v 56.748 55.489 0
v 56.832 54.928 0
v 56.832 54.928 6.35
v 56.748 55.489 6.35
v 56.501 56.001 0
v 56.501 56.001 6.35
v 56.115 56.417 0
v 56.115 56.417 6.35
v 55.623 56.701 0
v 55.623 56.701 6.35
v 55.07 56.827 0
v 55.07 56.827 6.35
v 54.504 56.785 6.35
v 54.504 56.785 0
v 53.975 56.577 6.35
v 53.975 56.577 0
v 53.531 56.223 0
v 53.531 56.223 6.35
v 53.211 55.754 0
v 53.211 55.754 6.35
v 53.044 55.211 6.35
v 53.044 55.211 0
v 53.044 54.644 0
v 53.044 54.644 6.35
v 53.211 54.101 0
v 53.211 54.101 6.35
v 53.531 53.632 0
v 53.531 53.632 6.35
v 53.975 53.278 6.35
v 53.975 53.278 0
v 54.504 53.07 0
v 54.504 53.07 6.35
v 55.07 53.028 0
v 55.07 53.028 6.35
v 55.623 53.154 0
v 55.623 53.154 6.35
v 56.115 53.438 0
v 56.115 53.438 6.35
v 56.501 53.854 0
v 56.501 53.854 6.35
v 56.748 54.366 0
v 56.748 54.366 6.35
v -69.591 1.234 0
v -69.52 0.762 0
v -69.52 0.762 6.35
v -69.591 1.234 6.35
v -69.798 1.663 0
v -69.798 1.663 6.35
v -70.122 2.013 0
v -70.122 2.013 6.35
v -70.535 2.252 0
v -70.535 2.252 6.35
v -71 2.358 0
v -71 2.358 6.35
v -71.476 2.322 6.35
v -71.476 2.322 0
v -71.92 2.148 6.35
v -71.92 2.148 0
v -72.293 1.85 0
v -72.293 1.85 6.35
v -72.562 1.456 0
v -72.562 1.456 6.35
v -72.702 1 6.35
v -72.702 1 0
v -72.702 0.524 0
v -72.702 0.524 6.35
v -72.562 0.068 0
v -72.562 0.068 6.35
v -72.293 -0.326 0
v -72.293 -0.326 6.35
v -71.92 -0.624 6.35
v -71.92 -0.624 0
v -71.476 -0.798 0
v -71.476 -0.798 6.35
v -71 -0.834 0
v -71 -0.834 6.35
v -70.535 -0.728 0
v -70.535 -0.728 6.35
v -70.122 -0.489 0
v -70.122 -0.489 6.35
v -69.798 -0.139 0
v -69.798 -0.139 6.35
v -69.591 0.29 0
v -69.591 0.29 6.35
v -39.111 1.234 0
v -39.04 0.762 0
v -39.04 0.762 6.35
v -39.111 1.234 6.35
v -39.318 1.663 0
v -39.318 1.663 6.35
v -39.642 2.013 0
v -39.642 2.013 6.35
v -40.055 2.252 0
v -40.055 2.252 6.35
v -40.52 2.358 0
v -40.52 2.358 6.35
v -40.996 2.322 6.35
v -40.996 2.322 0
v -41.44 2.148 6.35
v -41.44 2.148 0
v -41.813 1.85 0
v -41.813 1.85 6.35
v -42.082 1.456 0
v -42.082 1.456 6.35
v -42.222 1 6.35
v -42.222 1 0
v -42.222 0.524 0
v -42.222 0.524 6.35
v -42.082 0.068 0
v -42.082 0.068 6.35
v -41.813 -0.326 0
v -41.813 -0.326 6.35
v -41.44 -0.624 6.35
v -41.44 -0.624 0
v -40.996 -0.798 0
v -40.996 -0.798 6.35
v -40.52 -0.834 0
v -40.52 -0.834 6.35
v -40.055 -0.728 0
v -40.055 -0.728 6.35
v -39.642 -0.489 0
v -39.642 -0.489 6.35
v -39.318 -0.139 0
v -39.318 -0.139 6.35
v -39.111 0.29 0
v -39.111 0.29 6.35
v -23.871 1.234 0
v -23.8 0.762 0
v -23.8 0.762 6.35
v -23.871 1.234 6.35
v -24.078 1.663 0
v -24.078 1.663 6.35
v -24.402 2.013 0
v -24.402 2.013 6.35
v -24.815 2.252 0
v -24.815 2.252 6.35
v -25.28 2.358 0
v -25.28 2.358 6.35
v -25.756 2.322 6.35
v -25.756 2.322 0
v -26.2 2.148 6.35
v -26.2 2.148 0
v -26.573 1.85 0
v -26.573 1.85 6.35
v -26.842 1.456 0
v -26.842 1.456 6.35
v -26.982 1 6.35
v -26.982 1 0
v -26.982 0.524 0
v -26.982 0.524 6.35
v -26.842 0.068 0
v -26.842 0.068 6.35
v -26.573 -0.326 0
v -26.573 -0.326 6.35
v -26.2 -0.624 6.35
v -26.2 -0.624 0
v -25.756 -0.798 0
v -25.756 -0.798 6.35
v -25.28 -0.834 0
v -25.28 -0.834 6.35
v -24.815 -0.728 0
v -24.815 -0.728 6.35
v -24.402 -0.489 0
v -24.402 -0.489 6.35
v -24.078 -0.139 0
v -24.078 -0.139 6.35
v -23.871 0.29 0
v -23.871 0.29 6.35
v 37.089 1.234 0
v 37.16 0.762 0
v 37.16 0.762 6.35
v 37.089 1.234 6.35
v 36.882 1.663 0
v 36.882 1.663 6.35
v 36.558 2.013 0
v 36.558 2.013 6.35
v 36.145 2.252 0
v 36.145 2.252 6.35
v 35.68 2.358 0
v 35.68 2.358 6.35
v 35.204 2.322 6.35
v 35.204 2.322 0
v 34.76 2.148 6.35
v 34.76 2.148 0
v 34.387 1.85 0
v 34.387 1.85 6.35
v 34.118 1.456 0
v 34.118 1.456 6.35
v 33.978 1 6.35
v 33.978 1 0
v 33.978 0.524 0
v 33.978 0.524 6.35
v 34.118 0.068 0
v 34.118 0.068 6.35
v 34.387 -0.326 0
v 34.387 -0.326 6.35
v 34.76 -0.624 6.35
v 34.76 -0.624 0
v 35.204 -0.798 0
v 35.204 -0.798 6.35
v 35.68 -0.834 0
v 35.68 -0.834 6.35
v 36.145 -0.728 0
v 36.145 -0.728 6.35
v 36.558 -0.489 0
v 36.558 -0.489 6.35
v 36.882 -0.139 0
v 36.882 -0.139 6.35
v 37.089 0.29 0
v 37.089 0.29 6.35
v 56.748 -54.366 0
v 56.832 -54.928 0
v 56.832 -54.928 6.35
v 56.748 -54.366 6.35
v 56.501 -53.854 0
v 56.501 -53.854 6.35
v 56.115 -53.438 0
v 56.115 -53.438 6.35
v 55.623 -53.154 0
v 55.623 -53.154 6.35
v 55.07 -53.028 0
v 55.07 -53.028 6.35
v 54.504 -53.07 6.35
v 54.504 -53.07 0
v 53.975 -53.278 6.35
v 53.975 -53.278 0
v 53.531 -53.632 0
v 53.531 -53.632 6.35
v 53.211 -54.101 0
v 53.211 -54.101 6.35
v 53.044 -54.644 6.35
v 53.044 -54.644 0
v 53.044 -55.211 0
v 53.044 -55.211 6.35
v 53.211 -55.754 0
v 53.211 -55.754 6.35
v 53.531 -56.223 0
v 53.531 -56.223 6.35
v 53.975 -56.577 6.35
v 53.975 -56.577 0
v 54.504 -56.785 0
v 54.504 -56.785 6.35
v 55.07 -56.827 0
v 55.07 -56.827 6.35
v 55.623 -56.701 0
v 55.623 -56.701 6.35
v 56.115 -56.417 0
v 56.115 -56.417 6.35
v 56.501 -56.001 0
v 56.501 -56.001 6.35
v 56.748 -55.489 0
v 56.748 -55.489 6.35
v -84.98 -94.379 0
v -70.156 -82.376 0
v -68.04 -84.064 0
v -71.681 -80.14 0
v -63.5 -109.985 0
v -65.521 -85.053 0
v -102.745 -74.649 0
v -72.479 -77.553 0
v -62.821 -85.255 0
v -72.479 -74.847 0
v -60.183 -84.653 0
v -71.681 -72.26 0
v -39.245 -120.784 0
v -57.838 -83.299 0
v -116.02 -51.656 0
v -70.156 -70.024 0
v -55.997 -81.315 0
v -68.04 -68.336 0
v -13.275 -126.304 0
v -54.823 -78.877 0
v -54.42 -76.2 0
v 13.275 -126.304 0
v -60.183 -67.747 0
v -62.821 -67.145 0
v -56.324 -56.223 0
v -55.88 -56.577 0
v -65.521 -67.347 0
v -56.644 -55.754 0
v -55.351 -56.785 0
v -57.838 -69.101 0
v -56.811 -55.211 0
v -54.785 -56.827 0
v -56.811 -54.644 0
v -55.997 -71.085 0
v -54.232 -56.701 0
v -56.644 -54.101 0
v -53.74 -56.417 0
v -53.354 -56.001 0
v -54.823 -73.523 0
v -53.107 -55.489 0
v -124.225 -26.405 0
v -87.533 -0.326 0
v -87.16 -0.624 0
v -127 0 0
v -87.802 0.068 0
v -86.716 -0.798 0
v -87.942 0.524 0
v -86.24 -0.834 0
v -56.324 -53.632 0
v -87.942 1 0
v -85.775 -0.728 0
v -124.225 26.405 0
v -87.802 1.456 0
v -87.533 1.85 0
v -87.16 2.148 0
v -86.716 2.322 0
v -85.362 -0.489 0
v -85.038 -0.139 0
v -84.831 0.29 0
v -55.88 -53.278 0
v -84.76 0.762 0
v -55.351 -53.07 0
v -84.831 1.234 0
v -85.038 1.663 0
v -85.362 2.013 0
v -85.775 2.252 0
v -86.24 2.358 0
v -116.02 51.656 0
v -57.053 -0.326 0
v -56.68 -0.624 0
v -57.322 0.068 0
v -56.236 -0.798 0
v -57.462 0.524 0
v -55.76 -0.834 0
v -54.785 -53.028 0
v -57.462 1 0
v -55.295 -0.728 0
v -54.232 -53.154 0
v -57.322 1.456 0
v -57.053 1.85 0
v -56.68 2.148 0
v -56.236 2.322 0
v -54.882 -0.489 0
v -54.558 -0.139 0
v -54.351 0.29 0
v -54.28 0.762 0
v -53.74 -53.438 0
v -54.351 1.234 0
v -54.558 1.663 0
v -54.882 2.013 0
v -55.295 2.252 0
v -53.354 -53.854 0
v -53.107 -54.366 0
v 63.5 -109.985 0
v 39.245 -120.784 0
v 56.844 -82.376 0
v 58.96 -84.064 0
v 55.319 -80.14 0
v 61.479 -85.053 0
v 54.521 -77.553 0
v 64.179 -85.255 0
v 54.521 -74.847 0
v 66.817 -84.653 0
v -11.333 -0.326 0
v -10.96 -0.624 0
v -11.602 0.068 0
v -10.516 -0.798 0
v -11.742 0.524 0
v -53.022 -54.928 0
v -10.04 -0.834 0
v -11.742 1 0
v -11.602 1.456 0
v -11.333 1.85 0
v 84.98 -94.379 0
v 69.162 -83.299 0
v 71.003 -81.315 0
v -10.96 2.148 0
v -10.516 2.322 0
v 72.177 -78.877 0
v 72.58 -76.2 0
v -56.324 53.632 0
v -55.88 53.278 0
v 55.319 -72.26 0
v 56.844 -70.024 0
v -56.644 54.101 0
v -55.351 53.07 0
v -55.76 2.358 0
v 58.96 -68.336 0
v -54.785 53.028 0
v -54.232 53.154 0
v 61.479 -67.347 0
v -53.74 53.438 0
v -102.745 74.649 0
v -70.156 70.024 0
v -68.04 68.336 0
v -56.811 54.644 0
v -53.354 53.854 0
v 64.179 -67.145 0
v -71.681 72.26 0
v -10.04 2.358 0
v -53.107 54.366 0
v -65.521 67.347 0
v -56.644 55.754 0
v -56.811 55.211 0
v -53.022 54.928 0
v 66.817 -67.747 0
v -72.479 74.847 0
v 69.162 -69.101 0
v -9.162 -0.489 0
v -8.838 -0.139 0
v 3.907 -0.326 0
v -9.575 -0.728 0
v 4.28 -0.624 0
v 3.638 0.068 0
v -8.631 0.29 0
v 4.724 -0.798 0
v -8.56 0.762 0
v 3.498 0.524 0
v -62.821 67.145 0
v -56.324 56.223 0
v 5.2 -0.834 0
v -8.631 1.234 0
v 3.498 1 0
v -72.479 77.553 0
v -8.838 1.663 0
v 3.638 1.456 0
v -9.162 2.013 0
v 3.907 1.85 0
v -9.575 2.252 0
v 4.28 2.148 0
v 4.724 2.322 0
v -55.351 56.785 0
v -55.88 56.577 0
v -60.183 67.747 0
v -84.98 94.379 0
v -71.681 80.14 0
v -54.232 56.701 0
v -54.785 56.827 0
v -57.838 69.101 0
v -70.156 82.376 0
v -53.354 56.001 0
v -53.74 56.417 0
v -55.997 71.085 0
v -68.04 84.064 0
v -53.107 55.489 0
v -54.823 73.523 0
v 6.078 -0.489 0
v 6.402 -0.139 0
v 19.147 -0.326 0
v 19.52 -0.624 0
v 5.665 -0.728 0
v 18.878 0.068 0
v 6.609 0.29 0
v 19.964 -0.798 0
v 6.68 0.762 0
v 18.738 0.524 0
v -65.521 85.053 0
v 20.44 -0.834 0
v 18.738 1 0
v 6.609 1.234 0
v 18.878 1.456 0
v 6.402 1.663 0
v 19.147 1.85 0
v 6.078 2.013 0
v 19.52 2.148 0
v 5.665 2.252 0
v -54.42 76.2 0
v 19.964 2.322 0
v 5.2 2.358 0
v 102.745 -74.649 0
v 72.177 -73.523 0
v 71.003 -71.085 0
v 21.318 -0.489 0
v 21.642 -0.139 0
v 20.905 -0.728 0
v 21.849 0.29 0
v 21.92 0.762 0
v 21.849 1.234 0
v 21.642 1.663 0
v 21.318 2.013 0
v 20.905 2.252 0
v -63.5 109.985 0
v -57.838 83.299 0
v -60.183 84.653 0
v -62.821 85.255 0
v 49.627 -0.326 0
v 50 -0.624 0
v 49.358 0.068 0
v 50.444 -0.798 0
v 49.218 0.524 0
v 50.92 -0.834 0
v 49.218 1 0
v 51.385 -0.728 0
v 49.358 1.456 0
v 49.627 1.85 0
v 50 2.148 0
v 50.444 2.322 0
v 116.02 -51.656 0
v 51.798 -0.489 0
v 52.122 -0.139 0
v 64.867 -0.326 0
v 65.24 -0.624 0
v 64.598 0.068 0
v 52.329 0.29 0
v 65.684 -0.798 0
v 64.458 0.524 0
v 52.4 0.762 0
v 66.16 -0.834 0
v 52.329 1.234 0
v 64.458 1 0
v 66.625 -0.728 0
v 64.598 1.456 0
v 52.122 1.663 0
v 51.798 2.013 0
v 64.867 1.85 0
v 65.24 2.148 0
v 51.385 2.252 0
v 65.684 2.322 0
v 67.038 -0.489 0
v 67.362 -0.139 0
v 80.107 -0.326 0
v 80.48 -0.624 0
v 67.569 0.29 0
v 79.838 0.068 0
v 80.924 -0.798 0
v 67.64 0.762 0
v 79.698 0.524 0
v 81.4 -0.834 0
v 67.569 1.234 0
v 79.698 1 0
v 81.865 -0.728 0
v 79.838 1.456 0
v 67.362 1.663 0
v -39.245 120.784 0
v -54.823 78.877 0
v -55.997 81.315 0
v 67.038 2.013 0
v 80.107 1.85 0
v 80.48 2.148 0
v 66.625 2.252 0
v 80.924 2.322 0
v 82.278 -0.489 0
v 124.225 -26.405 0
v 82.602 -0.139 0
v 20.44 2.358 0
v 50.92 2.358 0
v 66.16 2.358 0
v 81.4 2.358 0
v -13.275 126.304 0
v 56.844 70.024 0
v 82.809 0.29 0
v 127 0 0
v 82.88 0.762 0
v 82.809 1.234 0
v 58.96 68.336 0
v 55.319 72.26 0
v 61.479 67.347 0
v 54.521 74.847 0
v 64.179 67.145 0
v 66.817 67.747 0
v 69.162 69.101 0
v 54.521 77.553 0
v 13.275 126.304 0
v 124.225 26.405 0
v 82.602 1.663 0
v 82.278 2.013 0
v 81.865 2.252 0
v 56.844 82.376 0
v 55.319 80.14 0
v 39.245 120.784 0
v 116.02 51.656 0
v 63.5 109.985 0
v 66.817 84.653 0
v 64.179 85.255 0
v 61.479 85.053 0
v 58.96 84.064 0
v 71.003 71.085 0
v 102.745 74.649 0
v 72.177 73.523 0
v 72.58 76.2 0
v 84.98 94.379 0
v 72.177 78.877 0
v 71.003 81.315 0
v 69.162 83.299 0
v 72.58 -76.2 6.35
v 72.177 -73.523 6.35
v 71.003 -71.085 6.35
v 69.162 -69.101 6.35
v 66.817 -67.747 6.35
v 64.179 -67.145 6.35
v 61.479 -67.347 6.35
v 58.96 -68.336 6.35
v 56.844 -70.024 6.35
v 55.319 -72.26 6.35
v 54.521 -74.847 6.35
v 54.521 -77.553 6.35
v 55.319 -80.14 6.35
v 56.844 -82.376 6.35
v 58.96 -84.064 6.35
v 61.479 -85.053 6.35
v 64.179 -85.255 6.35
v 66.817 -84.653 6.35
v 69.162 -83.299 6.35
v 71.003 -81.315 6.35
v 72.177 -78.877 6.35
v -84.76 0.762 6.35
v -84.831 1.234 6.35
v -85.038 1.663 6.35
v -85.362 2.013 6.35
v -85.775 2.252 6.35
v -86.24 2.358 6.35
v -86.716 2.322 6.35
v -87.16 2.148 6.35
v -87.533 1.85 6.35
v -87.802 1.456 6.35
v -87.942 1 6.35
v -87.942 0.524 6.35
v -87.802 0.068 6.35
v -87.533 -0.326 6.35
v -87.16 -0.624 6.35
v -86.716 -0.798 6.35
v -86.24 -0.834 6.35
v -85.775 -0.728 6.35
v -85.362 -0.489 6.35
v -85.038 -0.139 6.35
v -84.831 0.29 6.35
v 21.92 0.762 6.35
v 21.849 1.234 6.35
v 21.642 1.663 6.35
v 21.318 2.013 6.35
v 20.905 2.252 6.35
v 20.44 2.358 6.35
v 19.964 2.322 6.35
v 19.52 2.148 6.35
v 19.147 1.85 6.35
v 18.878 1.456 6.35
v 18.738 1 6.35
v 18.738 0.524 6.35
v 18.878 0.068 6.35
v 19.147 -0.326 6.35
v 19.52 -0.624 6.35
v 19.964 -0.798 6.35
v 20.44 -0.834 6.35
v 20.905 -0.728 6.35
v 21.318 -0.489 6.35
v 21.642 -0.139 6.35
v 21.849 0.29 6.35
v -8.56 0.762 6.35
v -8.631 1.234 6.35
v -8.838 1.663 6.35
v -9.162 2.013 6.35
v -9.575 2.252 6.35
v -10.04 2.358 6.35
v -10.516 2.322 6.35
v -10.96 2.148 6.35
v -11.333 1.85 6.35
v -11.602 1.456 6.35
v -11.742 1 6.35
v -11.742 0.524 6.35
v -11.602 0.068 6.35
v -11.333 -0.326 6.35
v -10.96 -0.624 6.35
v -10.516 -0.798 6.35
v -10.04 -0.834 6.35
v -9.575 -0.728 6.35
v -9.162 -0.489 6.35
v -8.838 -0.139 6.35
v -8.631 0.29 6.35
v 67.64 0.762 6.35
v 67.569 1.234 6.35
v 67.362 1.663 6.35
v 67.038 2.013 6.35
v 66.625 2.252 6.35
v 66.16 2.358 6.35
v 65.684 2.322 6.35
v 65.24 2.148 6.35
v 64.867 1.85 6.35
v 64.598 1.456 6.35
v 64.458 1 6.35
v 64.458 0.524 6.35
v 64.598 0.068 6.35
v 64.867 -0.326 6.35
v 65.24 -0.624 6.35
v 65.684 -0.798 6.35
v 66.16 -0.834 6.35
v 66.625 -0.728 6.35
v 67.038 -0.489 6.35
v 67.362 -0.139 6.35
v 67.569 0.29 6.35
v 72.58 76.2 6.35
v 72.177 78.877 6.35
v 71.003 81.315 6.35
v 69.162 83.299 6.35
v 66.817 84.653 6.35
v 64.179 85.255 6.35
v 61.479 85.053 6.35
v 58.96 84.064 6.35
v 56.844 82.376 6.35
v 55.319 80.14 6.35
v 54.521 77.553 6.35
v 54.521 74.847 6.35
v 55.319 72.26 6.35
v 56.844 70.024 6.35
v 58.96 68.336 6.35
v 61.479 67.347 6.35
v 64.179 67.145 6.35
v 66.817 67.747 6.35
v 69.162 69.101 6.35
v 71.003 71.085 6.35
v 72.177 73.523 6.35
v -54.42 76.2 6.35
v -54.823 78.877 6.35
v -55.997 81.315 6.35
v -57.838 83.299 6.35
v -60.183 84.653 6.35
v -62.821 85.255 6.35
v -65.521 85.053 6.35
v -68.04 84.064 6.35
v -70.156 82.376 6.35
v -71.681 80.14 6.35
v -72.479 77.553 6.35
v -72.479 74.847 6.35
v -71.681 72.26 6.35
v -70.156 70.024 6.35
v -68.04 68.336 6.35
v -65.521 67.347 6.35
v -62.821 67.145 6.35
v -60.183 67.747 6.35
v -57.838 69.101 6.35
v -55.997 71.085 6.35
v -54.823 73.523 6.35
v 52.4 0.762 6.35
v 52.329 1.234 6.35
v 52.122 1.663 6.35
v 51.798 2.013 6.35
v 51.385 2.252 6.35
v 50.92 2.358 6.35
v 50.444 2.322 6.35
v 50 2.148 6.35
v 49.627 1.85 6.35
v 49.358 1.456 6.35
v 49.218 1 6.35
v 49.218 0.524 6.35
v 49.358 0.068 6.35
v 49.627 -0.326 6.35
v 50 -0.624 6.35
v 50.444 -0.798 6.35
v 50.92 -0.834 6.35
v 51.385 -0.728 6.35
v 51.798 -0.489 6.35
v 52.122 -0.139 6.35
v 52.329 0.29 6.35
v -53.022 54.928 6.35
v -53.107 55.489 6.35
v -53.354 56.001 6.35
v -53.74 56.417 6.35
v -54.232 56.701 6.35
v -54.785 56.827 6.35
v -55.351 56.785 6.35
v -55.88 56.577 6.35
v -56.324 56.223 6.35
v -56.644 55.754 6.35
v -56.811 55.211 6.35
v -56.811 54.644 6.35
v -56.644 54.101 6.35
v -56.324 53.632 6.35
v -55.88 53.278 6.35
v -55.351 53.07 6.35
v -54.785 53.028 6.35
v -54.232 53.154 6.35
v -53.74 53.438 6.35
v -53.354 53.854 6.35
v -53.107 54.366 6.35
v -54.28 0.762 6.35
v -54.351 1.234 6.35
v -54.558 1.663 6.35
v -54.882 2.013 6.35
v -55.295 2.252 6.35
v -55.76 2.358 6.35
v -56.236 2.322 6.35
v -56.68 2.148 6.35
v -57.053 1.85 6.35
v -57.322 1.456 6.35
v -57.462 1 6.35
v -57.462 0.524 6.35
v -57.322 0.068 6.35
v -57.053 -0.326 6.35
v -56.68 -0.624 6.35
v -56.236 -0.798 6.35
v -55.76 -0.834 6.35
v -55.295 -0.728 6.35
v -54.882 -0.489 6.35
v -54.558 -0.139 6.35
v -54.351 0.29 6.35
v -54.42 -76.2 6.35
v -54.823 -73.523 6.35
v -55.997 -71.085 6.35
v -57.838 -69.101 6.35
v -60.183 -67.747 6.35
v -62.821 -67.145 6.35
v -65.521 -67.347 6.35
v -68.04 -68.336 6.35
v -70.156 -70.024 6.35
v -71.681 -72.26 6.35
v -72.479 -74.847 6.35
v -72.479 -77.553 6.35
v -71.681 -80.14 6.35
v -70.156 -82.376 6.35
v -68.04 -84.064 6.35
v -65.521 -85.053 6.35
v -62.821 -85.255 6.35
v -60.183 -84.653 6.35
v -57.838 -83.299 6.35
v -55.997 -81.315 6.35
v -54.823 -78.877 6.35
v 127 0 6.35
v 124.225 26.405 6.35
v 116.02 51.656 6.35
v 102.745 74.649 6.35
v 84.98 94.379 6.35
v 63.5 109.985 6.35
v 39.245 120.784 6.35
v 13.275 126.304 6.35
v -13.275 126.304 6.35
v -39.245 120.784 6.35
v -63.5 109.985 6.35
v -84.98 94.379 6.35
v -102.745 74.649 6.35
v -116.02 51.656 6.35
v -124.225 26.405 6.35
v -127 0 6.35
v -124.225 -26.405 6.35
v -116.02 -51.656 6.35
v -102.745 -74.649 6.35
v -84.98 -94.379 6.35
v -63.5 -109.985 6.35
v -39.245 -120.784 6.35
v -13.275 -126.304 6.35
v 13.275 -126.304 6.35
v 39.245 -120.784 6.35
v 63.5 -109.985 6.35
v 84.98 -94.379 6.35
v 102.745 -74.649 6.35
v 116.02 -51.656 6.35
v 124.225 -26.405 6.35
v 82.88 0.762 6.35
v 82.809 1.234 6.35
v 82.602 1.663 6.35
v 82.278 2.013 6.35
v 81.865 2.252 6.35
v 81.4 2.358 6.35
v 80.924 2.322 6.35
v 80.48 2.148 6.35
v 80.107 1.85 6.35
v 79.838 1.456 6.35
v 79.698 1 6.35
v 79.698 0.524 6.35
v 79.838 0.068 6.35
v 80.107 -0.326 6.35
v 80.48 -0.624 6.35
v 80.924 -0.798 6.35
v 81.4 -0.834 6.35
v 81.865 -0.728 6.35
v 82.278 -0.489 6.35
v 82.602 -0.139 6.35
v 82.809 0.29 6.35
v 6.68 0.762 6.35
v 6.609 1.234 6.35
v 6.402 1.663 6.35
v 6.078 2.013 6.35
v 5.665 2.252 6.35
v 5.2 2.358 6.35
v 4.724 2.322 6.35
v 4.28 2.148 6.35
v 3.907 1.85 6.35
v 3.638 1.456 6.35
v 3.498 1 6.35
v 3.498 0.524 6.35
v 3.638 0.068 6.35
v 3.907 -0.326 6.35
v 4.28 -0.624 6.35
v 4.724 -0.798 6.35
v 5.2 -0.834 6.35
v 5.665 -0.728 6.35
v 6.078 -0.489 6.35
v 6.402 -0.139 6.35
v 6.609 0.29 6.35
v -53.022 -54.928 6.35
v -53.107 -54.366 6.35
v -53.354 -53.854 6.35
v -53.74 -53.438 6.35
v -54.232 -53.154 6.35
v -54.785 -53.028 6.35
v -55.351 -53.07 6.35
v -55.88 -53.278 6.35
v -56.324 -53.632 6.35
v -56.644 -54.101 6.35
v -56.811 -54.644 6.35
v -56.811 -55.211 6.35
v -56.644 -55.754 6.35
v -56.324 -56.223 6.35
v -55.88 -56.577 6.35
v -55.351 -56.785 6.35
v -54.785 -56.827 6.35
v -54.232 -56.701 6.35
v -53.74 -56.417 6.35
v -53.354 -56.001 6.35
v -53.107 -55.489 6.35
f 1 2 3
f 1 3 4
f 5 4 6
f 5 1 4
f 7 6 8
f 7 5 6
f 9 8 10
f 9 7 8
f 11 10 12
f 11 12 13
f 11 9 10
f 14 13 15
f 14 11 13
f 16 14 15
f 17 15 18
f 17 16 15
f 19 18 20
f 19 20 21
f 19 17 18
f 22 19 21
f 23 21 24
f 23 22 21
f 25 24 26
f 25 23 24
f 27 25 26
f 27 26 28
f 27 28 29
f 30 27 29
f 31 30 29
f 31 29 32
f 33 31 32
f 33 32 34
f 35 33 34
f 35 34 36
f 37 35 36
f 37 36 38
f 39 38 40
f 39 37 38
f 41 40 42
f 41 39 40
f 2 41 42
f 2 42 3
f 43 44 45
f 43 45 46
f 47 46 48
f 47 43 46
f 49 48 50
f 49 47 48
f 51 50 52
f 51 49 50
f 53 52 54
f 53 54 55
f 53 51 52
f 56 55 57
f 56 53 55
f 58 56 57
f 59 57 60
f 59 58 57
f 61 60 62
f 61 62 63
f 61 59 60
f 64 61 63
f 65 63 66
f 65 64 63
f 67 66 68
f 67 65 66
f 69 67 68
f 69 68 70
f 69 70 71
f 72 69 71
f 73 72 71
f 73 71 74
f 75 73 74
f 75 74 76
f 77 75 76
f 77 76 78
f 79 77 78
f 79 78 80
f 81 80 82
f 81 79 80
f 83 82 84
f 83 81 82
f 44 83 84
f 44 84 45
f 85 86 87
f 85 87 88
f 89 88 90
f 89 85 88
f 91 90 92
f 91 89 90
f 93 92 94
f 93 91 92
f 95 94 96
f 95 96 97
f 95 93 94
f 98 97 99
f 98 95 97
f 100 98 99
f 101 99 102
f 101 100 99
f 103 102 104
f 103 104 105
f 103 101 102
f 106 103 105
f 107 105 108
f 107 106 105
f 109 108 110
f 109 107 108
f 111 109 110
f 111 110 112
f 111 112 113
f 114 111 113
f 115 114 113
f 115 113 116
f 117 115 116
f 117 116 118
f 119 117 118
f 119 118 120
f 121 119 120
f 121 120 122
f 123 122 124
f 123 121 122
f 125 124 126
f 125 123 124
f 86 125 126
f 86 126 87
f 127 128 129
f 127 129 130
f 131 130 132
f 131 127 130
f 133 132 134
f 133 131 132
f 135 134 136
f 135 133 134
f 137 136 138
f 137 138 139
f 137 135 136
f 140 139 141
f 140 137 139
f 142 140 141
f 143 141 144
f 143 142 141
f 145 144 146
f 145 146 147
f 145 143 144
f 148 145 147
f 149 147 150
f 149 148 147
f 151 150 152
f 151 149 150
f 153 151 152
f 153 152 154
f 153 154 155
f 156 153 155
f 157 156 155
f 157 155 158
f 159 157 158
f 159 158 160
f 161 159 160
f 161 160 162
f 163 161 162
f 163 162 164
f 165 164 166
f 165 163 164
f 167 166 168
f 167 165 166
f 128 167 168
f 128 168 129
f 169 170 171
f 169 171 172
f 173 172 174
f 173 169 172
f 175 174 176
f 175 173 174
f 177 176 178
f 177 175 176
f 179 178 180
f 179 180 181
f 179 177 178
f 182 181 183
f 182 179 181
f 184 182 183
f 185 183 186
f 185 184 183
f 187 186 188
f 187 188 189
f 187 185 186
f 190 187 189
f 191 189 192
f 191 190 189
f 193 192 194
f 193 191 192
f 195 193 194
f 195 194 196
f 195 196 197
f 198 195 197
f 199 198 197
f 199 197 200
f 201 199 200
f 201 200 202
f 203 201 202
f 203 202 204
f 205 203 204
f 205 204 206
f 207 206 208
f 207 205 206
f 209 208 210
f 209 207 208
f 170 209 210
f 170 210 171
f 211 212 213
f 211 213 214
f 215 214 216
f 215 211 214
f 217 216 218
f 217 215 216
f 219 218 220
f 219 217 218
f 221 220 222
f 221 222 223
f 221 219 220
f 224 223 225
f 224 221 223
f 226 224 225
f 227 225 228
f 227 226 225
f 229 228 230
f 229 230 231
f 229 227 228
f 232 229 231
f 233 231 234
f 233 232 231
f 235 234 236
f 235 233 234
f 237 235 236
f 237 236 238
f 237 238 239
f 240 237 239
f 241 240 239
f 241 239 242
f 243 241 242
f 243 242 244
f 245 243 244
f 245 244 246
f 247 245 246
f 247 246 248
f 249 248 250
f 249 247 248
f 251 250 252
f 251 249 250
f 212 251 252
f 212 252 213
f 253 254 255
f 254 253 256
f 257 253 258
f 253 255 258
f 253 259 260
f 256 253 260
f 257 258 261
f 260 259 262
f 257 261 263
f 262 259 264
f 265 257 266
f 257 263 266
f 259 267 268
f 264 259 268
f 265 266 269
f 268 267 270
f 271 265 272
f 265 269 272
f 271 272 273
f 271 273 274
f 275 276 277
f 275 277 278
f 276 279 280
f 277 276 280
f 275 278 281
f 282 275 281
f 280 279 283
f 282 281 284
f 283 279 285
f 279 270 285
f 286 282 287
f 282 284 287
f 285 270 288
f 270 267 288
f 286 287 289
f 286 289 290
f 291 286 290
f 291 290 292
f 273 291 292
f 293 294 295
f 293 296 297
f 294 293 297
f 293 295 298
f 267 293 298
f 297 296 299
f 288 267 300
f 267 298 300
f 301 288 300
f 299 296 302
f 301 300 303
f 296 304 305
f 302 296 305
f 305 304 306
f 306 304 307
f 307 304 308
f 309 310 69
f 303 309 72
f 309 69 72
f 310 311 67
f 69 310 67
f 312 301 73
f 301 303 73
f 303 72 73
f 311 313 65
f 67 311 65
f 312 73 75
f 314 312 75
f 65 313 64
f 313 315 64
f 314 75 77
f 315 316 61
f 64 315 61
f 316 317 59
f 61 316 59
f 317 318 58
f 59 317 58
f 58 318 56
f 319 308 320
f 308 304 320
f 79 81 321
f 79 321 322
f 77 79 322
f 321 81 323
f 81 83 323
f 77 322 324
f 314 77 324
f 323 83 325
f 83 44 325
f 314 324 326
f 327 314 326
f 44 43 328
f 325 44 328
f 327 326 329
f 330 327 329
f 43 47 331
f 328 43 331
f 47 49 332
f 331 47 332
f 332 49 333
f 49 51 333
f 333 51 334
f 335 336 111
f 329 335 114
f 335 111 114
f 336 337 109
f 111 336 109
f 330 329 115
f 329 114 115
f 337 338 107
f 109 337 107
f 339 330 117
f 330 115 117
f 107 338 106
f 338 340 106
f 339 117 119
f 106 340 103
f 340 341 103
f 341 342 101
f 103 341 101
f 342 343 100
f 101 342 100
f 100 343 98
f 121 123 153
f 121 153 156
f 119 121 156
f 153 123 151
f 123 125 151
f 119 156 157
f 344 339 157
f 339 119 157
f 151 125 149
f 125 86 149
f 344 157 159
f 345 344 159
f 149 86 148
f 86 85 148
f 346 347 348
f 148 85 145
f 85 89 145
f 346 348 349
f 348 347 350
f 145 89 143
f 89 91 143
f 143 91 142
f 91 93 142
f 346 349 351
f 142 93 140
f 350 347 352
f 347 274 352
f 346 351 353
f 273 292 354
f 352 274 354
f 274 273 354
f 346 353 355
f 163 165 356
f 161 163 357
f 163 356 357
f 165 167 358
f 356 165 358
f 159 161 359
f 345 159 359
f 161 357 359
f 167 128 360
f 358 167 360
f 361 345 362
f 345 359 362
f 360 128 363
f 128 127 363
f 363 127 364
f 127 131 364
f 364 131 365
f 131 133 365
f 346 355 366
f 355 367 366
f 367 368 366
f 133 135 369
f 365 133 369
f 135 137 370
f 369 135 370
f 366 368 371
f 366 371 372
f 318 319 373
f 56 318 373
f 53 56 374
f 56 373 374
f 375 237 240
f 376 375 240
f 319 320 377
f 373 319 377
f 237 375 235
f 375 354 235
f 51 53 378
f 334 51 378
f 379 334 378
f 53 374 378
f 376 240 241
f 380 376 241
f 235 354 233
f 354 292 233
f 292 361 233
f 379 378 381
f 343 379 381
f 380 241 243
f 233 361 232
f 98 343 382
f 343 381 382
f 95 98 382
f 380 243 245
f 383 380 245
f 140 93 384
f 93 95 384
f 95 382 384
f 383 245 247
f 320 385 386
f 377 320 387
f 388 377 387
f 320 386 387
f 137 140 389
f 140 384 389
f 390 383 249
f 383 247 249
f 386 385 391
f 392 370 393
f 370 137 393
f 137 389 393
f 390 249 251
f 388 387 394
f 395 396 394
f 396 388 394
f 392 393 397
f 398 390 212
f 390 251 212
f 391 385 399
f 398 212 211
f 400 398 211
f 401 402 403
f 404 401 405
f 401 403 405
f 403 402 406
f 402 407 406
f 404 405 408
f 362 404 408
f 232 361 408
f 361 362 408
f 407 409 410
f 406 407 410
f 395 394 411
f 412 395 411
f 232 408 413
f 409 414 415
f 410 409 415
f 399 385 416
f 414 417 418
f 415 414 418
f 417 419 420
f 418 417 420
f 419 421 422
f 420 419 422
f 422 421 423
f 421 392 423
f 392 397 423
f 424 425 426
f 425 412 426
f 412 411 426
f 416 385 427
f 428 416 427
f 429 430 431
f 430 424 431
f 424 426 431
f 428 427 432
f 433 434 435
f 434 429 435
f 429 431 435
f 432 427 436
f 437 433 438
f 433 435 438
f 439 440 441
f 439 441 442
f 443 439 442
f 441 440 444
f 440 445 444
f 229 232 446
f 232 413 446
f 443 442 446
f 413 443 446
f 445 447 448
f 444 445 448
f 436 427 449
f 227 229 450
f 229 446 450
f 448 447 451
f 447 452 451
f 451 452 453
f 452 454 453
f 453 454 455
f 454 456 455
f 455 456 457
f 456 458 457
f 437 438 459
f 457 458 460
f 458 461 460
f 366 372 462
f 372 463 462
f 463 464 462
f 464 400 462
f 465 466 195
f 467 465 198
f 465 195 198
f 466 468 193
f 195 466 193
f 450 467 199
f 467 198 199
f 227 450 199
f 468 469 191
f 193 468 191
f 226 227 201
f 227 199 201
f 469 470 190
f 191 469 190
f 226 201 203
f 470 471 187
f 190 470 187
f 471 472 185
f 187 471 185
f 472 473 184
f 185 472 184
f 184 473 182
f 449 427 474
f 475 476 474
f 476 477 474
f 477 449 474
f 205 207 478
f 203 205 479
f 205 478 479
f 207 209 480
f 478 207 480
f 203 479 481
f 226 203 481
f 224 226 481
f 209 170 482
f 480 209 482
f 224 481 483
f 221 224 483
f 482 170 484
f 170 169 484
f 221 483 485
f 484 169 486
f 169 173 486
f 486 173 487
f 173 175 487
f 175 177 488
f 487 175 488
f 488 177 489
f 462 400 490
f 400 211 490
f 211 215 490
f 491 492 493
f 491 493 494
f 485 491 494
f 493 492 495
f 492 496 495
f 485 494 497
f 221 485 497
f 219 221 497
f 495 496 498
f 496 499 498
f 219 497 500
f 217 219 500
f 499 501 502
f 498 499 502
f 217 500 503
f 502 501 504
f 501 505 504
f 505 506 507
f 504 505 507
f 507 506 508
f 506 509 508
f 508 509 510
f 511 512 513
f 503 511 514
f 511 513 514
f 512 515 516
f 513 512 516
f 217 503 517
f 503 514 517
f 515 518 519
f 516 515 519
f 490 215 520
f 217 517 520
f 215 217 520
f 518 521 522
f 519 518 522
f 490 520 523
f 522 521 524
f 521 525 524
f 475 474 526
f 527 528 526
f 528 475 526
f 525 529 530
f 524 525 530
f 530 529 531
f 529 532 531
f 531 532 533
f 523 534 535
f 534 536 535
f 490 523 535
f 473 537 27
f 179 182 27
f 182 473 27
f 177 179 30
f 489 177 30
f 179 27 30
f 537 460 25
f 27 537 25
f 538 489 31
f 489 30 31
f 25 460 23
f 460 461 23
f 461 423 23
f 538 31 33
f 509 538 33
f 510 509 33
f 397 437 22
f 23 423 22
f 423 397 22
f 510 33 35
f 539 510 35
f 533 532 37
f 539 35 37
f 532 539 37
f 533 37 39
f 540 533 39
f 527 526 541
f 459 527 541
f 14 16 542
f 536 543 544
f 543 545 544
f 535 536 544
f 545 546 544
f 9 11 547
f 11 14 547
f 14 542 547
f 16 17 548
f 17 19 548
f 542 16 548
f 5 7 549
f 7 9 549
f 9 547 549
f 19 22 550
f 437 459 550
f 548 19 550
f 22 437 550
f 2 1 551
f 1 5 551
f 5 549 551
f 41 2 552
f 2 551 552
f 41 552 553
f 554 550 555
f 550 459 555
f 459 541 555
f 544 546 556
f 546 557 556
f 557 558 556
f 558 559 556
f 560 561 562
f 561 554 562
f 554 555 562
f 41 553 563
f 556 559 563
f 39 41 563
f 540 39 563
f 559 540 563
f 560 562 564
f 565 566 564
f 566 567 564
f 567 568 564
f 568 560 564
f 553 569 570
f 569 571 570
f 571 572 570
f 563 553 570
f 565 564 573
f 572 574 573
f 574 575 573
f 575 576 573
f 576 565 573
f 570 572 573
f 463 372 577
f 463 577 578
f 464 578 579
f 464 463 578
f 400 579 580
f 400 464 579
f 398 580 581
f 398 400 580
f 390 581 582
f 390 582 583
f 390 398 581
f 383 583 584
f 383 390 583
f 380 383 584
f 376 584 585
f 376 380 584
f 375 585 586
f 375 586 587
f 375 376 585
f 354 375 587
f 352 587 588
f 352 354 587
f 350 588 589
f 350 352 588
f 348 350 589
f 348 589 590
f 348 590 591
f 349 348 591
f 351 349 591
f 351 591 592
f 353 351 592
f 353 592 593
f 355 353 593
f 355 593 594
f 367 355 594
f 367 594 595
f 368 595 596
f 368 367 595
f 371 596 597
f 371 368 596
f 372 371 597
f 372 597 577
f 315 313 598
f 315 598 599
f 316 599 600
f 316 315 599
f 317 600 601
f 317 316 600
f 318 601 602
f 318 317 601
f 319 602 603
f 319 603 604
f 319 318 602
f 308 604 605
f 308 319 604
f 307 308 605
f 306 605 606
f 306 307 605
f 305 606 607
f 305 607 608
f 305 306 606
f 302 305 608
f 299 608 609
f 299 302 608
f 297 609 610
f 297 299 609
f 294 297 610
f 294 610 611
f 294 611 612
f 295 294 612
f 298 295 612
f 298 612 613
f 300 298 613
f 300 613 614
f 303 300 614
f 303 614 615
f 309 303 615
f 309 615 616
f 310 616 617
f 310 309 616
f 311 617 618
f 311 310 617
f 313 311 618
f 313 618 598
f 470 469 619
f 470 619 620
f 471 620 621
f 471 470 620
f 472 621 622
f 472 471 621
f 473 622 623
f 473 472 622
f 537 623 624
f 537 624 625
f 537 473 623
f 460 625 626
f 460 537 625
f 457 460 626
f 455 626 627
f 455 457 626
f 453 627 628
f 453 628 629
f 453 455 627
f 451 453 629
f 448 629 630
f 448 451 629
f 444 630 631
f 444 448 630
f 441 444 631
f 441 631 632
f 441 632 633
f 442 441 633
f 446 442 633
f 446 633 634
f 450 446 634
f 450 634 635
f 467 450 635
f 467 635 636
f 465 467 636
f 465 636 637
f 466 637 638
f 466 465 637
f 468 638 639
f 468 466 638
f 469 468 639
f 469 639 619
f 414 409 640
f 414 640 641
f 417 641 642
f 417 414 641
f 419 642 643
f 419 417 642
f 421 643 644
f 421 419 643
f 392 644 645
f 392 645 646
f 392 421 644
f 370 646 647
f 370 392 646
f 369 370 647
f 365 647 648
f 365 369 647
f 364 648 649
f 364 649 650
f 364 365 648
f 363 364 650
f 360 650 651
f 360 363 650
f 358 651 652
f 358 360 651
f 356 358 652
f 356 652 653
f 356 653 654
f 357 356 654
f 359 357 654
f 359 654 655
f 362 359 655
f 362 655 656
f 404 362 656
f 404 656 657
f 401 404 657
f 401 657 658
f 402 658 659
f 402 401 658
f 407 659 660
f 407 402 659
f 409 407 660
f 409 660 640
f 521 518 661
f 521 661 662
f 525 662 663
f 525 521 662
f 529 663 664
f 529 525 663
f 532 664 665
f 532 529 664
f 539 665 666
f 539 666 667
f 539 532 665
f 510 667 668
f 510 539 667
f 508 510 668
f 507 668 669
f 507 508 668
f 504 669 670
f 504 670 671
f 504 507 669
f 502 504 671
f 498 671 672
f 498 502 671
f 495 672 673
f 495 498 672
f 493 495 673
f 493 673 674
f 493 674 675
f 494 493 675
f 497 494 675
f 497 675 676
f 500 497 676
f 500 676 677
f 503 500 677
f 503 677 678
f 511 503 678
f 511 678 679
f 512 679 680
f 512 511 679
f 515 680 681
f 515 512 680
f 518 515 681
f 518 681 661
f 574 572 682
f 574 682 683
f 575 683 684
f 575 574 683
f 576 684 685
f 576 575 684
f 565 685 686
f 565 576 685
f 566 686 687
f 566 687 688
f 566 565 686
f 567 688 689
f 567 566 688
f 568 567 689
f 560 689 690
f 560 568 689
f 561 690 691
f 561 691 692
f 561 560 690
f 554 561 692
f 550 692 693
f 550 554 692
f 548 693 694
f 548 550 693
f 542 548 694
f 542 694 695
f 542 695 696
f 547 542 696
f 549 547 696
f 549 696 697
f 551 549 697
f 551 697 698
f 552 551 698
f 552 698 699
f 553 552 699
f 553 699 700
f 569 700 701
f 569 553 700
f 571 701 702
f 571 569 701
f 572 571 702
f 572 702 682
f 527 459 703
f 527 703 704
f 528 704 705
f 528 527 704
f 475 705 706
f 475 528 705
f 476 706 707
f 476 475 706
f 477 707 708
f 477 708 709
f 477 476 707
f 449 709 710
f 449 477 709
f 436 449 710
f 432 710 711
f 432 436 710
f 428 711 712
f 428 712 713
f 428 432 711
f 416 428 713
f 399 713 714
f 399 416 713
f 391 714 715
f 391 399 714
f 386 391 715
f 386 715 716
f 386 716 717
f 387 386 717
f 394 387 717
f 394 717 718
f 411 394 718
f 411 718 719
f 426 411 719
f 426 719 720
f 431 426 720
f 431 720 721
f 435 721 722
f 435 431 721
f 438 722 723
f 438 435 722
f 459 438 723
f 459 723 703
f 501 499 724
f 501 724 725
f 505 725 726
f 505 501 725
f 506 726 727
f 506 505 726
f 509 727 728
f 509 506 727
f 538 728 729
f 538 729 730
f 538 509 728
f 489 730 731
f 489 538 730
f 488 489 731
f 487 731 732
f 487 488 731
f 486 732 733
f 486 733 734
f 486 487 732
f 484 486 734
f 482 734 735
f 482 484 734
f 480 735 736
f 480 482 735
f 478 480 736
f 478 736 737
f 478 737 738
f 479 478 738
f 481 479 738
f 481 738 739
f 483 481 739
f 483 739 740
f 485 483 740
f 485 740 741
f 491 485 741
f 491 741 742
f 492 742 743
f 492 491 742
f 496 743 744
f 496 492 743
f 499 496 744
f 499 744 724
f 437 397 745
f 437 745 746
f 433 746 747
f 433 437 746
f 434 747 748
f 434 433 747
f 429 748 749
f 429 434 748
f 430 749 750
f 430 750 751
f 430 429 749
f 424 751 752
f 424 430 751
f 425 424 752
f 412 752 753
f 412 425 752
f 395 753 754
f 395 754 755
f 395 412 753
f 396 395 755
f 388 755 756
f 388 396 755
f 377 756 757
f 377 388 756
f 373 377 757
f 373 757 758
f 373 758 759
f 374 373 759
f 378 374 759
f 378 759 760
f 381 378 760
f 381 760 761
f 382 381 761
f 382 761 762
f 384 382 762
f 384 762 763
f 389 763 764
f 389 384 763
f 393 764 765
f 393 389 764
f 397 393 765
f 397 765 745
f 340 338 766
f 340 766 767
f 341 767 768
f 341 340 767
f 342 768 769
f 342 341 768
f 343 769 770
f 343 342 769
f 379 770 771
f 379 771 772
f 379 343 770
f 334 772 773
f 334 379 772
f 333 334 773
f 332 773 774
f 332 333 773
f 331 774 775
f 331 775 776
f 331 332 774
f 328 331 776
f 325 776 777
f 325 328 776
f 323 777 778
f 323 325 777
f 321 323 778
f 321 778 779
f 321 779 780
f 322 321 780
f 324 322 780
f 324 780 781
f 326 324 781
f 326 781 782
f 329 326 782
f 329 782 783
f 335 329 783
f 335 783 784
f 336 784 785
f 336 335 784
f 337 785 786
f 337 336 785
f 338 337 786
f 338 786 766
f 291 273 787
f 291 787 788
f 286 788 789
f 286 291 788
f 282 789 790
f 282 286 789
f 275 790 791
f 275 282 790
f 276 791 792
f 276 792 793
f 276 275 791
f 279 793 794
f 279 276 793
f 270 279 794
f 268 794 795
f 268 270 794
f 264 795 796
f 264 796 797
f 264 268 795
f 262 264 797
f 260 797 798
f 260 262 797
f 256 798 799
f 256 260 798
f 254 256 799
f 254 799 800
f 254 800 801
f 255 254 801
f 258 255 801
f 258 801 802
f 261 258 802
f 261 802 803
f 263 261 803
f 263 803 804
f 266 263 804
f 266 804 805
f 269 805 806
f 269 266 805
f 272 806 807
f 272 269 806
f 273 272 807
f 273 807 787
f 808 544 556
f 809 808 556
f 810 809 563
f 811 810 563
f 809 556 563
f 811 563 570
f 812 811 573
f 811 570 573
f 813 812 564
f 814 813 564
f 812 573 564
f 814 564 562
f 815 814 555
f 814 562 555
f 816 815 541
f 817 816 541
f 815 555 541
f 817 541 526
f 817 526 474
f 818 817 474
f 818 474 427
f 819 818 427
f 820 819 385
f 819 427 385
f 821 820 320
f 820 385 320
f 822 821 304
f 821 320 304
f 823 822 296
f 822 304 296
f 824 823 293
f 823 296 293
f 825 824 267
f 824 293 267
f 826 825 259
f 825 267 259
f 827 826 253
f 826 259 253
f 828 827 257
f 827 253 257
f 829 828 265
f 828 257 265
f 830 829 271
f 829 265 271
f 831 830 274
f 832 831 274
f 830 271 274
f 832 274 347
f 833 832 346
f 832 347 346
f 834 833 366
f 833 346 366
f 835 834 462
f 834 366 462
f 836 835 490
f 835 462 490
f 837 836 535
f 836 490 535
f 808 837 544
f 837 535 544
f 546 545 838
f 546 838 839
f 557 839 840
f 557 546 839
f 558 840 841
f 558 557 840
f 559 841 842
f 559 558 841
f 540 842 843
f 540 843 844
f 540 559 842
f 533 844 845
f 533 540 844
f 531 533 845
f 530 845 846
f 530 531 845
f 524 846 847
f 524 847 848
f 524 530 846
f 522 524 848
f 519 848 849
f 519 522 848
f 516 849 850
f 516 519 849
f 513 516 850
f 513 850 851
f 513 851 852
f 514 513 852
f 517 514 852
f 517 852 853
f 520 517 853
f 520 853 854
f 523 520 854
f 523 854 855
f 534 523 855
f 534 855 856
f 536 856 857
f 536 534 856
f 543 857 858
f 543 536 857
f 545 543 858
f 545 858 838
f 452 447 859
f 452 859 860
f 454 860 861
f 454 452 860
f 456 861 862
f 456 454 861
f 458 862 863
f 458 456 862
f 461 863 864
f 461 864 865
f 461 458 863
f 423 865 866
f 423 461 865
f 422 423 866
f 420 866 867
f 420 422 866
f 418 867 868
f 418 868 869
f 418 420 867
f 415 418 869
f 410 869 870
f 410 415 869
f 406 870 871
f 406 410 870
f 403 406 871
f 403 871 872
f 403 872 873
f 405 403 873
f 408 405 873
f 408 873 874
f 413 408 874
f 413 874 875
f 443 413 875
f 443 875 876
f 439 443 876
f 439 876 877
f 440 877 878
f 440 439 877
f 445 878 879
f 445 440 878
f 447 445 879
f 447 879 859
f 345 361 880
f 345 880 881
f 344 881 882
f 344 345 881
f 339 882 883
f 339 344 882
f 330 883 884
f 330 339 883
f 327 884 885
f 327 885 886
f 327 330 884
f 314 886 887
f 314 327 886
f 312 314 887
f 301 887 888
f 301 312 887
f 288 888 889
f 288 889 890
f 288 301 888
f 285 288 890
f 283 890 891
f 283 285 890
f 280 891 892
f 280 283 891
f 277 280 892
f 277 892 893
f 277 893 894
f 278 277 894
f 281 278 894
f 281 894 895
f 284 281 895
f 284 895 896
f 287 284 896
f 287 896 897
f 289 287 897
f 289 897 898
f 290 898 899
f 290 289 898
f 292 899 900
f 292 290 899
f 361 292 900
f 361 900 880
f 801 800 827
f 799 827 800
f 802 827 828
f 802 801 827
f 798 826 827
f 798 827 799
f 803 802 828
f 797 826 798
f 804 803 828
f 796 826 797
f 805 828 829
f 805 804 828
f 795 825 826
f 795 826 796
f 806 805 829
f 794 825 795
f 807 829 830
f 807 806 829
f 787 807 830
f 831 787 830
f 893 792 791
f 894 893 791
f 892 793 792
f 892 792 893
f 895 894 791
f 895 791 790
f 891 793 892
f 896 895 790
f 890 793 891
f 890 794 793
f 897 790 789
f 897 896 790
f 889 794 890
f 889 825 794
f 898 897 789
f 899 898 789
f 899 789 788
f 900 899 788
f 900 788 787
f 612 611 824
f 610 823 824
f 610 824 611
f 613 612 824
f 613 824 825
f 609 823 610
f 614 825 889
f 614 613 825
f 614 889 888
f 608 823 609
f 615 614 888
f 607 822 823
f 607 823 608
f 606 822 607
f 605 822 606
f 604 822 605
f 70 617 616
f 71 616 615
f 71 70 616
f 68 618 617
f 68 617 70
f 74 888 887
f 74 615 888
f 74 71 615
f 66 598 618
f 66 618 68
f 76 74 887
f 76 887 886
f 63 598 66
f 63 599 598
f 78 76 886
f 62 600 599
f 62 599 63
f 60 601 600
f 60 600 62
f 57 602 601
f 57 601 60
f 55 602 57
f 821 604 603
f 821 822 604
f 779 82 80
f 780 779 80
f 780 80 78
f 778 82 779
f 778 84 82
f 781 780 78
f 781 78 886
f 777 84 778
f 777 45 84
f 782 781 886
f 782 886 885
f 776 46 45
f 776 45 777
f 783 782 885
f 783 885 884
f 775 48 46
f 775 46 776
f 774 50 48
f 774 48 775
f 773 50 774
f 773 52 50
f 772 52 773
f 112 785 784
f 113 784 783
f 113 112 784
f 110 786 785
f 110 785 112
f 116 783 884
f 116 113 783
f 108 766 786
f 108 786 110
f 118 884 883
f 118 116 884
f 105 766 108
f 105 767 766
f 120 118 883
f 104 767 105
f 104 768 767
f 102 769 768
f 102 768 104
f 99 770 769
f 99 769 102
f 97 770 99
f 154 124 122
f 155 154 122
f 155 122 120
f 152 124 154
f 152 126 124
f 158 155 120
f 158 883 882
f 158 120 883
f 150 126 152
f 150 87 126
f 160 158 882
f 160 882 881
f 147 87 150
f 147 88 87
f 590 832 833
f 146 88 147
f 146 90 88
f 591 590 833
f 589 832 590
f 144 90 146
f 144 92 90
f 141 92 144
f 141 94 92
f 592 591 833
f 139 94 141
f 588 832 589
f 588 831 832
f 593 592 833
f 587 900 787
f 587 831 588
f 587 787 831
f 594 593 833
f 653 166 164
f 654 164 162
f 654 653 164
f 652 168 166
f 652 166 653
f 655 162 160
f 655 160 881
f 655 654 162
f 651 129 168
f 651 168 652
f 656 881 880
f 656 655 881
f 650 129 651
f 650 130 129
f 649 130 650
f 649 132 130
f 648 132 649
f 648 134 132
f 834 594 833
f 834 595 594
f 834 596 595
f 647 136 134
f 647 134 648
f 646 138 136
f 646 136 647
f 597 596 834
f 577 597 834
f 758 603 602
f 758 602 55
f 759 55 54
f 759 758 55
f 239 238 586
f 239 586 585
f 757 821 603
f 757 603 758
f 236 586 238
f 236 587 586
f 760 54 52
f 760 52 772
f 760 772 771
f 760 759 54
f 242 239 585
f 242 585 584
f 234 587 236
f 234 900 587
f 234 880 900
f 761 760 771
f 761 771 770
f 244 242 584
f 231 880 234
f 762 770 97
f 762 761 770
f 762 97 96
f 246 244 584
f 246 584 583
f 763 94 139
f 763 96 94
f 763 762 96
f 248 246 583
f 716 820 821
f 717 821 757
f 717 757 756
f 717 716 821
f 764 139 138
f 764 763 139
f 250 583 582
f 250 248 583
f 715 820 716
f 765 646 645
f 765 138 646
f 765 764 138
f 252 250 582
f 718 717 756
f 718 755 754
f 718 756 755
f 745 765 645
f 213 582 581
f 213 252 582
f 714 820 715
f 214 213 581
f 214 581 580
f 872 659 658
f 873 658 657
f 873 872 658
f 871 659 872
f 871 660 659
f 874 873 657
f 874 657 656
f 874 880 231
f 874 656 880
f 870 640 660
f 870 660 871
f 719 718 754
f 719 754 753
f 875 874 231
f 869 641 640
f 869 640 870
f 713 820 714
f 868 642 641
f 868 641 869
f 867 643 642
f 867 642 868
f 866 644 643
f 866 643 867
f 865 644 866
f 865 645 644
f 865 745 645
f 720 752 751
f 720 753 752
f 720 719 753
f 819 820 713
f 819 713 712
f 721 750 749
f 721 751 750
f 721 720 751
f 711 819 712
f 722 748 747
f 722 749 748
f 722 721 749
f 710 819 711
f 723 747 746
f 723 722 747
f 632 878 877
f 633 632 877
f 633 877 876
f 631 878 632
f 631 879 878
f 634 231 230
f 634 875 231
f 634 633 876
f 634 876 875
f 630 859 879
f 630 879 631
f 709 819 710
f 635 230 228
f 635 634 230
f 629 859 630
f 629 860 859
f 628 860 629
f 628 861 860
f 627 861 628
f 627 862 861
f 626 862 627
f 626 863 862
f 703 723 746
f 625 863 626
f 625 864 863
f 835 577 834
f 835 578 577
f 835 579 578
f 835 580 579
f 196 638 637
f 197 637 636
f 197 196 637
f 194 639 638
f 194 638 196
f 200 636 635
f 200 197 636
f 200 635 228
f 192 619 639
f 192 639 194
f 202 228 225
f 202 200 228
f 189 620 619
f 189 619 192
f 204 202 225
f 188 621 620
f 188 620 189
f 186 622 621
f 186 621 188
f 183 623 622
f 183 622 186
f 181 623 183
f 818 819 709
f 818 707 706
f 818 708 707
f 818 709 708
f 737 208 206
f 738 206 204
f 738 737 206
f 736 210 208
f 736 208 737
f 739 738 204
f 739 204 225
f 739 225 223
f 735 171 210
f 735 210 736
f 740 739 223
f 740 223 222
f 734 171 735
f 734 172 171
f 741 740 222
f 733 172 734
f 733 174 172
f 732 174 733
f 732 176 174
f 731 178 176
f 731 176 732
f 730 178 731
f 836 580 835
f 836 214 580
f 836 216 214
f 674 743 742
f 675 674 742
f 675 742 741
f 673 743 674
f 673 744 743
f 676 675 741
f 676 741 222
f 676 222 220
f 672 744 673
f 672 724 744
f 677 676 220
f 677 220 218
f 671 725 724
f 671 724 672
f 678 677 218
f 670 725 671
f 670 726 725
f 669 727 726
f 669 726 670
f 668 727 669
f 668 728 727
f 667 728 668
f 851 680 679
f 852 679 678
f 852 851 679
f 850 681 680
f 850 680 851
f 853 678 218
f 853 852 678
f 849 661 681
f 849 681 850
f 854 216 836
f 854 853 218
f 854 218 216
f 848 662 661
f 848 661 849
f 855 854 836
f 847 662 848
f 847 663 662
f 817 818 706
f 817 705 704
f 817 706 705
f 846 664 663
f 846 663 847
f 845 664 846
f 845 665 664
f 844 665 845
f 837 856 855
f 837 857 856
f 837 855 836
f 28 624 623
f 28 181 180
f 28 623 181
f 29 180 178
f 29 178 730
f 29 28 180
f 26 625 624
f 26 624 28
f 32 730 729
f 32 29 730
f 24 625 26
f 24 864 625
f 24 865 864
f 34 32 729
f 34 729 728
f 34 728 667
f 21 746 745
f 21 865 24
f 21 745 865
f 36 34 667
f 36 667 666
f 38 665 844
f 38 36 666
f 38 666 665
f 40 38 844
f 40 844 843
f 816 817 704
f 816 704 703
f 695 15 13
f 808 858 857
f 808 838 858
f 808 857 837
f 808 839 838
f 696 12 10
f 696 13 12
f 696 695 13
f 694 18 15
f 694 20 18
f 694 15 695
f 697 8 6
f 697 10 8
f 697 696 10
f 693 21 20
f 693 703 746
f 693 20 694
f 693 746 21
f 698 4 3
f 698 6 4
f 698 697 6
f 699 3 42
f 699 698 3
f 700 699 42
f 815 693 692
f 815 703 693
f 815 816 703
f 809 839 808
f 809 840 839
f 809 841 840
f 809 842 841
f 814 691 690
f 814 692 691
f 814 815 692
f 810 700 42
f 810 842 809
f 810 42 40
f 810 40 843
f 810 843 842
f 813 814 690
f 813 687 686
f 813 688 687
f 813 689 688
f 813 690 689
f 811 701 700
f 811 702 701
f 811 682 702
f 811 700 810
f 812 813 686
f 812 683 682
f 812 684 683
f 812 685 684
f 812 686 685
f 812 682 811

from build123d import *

# Parameters (mm, degrees)
F0_R     = 127
F0_R_2   = 9.0805
F0_R_3   = 1.905
F0_R_4   = 1.6002
F1_DEPTH = 6.35


with BuildPart() as f1:
    # F0 (on Top) → F1 (new body)
    with BuildSketch(Plane.XY):
        Circle(F0_R)
        with Locations((-63.5, -76.2)):
            Circle(F0_R_2, mode=Mode.SUBTRACT)
        with Locations((-54.9275, -54.9275)):
            Circle(F0_R_3, mode=Mode.SUBTRACT)
        with Locations((63.5, -76.2)):
            Circle(F0_R_2, mode=Mode.SUBTRACT)
        with Locations((54.9275, -54.9275)):
            Circle(F0_R_3, mode=Mode.SUBTRACT)
        with Locations((-86.36, 0.762)):
            Circle(F0_R_4, mode=Mode.SUBTRACT)
        with Locations((-71.12, 0.762)):
            Circle(F0_R_4, mode=Mode.SUBTRACT)
        with Locations((-55.88, 0.762)):
            Circle(F0_R_4, mode=Mode.SUBTRACT)
        with Locations((-40.64, 0.762)):
            Circle(F0_R_4, mode=Mode.SUBTRACT)
        with Locations((-25.4, 0.762)):
            Circle(F0_R_4, mode=Mode.SUBTRACT)
        with Locations((-10.16, 0.762)):
            Circle(F0_R_4, mode=Mode.SUBTRACT)
        with Locations((-54.9275, 54.9275)):
            Circle(F0_R_3, mode=Mode.SUBTRACT)
        with Locations((-63.5, 76.2)):
            Circle(F0_R_2, mode=Mode.SUBTRACT)
        with Locations((5.08, 0.762)):
            Circle(F0_R_4, mode=Mode.SUBTRACT)
        with Locations((20.32, 0.762)):
            Circle(F0_R_4, mode=Mode.SUBTRACT)
        with Locations((35.56, 0.762)):
            Circle(F0_R_4, mode=Mode.SUBTRACT)
        with Locations((50.8, 0.762)):
            Circle(F0_R_4, mode=Mode.SUBTRACT)
        with Locations((54.9275, 54.9275)):
            Circle(F0_R_3, mode=Mode.SUBTRACT)
        with Locations((66.04, 0.762)):
            Circle(F0_R_4, mode=Mode.SUBTRACT)
        with Locations((81.28, 0.762)):
            Circle(F0_R_4, mode=Mode.SUBTRACT)
        with Locations((63.5, 76.2)):
            Circle(F0_R_2, mode=Mode.SUBTRACT)
    extrude(amount=F1_DEPTH)


solid = f1.part
